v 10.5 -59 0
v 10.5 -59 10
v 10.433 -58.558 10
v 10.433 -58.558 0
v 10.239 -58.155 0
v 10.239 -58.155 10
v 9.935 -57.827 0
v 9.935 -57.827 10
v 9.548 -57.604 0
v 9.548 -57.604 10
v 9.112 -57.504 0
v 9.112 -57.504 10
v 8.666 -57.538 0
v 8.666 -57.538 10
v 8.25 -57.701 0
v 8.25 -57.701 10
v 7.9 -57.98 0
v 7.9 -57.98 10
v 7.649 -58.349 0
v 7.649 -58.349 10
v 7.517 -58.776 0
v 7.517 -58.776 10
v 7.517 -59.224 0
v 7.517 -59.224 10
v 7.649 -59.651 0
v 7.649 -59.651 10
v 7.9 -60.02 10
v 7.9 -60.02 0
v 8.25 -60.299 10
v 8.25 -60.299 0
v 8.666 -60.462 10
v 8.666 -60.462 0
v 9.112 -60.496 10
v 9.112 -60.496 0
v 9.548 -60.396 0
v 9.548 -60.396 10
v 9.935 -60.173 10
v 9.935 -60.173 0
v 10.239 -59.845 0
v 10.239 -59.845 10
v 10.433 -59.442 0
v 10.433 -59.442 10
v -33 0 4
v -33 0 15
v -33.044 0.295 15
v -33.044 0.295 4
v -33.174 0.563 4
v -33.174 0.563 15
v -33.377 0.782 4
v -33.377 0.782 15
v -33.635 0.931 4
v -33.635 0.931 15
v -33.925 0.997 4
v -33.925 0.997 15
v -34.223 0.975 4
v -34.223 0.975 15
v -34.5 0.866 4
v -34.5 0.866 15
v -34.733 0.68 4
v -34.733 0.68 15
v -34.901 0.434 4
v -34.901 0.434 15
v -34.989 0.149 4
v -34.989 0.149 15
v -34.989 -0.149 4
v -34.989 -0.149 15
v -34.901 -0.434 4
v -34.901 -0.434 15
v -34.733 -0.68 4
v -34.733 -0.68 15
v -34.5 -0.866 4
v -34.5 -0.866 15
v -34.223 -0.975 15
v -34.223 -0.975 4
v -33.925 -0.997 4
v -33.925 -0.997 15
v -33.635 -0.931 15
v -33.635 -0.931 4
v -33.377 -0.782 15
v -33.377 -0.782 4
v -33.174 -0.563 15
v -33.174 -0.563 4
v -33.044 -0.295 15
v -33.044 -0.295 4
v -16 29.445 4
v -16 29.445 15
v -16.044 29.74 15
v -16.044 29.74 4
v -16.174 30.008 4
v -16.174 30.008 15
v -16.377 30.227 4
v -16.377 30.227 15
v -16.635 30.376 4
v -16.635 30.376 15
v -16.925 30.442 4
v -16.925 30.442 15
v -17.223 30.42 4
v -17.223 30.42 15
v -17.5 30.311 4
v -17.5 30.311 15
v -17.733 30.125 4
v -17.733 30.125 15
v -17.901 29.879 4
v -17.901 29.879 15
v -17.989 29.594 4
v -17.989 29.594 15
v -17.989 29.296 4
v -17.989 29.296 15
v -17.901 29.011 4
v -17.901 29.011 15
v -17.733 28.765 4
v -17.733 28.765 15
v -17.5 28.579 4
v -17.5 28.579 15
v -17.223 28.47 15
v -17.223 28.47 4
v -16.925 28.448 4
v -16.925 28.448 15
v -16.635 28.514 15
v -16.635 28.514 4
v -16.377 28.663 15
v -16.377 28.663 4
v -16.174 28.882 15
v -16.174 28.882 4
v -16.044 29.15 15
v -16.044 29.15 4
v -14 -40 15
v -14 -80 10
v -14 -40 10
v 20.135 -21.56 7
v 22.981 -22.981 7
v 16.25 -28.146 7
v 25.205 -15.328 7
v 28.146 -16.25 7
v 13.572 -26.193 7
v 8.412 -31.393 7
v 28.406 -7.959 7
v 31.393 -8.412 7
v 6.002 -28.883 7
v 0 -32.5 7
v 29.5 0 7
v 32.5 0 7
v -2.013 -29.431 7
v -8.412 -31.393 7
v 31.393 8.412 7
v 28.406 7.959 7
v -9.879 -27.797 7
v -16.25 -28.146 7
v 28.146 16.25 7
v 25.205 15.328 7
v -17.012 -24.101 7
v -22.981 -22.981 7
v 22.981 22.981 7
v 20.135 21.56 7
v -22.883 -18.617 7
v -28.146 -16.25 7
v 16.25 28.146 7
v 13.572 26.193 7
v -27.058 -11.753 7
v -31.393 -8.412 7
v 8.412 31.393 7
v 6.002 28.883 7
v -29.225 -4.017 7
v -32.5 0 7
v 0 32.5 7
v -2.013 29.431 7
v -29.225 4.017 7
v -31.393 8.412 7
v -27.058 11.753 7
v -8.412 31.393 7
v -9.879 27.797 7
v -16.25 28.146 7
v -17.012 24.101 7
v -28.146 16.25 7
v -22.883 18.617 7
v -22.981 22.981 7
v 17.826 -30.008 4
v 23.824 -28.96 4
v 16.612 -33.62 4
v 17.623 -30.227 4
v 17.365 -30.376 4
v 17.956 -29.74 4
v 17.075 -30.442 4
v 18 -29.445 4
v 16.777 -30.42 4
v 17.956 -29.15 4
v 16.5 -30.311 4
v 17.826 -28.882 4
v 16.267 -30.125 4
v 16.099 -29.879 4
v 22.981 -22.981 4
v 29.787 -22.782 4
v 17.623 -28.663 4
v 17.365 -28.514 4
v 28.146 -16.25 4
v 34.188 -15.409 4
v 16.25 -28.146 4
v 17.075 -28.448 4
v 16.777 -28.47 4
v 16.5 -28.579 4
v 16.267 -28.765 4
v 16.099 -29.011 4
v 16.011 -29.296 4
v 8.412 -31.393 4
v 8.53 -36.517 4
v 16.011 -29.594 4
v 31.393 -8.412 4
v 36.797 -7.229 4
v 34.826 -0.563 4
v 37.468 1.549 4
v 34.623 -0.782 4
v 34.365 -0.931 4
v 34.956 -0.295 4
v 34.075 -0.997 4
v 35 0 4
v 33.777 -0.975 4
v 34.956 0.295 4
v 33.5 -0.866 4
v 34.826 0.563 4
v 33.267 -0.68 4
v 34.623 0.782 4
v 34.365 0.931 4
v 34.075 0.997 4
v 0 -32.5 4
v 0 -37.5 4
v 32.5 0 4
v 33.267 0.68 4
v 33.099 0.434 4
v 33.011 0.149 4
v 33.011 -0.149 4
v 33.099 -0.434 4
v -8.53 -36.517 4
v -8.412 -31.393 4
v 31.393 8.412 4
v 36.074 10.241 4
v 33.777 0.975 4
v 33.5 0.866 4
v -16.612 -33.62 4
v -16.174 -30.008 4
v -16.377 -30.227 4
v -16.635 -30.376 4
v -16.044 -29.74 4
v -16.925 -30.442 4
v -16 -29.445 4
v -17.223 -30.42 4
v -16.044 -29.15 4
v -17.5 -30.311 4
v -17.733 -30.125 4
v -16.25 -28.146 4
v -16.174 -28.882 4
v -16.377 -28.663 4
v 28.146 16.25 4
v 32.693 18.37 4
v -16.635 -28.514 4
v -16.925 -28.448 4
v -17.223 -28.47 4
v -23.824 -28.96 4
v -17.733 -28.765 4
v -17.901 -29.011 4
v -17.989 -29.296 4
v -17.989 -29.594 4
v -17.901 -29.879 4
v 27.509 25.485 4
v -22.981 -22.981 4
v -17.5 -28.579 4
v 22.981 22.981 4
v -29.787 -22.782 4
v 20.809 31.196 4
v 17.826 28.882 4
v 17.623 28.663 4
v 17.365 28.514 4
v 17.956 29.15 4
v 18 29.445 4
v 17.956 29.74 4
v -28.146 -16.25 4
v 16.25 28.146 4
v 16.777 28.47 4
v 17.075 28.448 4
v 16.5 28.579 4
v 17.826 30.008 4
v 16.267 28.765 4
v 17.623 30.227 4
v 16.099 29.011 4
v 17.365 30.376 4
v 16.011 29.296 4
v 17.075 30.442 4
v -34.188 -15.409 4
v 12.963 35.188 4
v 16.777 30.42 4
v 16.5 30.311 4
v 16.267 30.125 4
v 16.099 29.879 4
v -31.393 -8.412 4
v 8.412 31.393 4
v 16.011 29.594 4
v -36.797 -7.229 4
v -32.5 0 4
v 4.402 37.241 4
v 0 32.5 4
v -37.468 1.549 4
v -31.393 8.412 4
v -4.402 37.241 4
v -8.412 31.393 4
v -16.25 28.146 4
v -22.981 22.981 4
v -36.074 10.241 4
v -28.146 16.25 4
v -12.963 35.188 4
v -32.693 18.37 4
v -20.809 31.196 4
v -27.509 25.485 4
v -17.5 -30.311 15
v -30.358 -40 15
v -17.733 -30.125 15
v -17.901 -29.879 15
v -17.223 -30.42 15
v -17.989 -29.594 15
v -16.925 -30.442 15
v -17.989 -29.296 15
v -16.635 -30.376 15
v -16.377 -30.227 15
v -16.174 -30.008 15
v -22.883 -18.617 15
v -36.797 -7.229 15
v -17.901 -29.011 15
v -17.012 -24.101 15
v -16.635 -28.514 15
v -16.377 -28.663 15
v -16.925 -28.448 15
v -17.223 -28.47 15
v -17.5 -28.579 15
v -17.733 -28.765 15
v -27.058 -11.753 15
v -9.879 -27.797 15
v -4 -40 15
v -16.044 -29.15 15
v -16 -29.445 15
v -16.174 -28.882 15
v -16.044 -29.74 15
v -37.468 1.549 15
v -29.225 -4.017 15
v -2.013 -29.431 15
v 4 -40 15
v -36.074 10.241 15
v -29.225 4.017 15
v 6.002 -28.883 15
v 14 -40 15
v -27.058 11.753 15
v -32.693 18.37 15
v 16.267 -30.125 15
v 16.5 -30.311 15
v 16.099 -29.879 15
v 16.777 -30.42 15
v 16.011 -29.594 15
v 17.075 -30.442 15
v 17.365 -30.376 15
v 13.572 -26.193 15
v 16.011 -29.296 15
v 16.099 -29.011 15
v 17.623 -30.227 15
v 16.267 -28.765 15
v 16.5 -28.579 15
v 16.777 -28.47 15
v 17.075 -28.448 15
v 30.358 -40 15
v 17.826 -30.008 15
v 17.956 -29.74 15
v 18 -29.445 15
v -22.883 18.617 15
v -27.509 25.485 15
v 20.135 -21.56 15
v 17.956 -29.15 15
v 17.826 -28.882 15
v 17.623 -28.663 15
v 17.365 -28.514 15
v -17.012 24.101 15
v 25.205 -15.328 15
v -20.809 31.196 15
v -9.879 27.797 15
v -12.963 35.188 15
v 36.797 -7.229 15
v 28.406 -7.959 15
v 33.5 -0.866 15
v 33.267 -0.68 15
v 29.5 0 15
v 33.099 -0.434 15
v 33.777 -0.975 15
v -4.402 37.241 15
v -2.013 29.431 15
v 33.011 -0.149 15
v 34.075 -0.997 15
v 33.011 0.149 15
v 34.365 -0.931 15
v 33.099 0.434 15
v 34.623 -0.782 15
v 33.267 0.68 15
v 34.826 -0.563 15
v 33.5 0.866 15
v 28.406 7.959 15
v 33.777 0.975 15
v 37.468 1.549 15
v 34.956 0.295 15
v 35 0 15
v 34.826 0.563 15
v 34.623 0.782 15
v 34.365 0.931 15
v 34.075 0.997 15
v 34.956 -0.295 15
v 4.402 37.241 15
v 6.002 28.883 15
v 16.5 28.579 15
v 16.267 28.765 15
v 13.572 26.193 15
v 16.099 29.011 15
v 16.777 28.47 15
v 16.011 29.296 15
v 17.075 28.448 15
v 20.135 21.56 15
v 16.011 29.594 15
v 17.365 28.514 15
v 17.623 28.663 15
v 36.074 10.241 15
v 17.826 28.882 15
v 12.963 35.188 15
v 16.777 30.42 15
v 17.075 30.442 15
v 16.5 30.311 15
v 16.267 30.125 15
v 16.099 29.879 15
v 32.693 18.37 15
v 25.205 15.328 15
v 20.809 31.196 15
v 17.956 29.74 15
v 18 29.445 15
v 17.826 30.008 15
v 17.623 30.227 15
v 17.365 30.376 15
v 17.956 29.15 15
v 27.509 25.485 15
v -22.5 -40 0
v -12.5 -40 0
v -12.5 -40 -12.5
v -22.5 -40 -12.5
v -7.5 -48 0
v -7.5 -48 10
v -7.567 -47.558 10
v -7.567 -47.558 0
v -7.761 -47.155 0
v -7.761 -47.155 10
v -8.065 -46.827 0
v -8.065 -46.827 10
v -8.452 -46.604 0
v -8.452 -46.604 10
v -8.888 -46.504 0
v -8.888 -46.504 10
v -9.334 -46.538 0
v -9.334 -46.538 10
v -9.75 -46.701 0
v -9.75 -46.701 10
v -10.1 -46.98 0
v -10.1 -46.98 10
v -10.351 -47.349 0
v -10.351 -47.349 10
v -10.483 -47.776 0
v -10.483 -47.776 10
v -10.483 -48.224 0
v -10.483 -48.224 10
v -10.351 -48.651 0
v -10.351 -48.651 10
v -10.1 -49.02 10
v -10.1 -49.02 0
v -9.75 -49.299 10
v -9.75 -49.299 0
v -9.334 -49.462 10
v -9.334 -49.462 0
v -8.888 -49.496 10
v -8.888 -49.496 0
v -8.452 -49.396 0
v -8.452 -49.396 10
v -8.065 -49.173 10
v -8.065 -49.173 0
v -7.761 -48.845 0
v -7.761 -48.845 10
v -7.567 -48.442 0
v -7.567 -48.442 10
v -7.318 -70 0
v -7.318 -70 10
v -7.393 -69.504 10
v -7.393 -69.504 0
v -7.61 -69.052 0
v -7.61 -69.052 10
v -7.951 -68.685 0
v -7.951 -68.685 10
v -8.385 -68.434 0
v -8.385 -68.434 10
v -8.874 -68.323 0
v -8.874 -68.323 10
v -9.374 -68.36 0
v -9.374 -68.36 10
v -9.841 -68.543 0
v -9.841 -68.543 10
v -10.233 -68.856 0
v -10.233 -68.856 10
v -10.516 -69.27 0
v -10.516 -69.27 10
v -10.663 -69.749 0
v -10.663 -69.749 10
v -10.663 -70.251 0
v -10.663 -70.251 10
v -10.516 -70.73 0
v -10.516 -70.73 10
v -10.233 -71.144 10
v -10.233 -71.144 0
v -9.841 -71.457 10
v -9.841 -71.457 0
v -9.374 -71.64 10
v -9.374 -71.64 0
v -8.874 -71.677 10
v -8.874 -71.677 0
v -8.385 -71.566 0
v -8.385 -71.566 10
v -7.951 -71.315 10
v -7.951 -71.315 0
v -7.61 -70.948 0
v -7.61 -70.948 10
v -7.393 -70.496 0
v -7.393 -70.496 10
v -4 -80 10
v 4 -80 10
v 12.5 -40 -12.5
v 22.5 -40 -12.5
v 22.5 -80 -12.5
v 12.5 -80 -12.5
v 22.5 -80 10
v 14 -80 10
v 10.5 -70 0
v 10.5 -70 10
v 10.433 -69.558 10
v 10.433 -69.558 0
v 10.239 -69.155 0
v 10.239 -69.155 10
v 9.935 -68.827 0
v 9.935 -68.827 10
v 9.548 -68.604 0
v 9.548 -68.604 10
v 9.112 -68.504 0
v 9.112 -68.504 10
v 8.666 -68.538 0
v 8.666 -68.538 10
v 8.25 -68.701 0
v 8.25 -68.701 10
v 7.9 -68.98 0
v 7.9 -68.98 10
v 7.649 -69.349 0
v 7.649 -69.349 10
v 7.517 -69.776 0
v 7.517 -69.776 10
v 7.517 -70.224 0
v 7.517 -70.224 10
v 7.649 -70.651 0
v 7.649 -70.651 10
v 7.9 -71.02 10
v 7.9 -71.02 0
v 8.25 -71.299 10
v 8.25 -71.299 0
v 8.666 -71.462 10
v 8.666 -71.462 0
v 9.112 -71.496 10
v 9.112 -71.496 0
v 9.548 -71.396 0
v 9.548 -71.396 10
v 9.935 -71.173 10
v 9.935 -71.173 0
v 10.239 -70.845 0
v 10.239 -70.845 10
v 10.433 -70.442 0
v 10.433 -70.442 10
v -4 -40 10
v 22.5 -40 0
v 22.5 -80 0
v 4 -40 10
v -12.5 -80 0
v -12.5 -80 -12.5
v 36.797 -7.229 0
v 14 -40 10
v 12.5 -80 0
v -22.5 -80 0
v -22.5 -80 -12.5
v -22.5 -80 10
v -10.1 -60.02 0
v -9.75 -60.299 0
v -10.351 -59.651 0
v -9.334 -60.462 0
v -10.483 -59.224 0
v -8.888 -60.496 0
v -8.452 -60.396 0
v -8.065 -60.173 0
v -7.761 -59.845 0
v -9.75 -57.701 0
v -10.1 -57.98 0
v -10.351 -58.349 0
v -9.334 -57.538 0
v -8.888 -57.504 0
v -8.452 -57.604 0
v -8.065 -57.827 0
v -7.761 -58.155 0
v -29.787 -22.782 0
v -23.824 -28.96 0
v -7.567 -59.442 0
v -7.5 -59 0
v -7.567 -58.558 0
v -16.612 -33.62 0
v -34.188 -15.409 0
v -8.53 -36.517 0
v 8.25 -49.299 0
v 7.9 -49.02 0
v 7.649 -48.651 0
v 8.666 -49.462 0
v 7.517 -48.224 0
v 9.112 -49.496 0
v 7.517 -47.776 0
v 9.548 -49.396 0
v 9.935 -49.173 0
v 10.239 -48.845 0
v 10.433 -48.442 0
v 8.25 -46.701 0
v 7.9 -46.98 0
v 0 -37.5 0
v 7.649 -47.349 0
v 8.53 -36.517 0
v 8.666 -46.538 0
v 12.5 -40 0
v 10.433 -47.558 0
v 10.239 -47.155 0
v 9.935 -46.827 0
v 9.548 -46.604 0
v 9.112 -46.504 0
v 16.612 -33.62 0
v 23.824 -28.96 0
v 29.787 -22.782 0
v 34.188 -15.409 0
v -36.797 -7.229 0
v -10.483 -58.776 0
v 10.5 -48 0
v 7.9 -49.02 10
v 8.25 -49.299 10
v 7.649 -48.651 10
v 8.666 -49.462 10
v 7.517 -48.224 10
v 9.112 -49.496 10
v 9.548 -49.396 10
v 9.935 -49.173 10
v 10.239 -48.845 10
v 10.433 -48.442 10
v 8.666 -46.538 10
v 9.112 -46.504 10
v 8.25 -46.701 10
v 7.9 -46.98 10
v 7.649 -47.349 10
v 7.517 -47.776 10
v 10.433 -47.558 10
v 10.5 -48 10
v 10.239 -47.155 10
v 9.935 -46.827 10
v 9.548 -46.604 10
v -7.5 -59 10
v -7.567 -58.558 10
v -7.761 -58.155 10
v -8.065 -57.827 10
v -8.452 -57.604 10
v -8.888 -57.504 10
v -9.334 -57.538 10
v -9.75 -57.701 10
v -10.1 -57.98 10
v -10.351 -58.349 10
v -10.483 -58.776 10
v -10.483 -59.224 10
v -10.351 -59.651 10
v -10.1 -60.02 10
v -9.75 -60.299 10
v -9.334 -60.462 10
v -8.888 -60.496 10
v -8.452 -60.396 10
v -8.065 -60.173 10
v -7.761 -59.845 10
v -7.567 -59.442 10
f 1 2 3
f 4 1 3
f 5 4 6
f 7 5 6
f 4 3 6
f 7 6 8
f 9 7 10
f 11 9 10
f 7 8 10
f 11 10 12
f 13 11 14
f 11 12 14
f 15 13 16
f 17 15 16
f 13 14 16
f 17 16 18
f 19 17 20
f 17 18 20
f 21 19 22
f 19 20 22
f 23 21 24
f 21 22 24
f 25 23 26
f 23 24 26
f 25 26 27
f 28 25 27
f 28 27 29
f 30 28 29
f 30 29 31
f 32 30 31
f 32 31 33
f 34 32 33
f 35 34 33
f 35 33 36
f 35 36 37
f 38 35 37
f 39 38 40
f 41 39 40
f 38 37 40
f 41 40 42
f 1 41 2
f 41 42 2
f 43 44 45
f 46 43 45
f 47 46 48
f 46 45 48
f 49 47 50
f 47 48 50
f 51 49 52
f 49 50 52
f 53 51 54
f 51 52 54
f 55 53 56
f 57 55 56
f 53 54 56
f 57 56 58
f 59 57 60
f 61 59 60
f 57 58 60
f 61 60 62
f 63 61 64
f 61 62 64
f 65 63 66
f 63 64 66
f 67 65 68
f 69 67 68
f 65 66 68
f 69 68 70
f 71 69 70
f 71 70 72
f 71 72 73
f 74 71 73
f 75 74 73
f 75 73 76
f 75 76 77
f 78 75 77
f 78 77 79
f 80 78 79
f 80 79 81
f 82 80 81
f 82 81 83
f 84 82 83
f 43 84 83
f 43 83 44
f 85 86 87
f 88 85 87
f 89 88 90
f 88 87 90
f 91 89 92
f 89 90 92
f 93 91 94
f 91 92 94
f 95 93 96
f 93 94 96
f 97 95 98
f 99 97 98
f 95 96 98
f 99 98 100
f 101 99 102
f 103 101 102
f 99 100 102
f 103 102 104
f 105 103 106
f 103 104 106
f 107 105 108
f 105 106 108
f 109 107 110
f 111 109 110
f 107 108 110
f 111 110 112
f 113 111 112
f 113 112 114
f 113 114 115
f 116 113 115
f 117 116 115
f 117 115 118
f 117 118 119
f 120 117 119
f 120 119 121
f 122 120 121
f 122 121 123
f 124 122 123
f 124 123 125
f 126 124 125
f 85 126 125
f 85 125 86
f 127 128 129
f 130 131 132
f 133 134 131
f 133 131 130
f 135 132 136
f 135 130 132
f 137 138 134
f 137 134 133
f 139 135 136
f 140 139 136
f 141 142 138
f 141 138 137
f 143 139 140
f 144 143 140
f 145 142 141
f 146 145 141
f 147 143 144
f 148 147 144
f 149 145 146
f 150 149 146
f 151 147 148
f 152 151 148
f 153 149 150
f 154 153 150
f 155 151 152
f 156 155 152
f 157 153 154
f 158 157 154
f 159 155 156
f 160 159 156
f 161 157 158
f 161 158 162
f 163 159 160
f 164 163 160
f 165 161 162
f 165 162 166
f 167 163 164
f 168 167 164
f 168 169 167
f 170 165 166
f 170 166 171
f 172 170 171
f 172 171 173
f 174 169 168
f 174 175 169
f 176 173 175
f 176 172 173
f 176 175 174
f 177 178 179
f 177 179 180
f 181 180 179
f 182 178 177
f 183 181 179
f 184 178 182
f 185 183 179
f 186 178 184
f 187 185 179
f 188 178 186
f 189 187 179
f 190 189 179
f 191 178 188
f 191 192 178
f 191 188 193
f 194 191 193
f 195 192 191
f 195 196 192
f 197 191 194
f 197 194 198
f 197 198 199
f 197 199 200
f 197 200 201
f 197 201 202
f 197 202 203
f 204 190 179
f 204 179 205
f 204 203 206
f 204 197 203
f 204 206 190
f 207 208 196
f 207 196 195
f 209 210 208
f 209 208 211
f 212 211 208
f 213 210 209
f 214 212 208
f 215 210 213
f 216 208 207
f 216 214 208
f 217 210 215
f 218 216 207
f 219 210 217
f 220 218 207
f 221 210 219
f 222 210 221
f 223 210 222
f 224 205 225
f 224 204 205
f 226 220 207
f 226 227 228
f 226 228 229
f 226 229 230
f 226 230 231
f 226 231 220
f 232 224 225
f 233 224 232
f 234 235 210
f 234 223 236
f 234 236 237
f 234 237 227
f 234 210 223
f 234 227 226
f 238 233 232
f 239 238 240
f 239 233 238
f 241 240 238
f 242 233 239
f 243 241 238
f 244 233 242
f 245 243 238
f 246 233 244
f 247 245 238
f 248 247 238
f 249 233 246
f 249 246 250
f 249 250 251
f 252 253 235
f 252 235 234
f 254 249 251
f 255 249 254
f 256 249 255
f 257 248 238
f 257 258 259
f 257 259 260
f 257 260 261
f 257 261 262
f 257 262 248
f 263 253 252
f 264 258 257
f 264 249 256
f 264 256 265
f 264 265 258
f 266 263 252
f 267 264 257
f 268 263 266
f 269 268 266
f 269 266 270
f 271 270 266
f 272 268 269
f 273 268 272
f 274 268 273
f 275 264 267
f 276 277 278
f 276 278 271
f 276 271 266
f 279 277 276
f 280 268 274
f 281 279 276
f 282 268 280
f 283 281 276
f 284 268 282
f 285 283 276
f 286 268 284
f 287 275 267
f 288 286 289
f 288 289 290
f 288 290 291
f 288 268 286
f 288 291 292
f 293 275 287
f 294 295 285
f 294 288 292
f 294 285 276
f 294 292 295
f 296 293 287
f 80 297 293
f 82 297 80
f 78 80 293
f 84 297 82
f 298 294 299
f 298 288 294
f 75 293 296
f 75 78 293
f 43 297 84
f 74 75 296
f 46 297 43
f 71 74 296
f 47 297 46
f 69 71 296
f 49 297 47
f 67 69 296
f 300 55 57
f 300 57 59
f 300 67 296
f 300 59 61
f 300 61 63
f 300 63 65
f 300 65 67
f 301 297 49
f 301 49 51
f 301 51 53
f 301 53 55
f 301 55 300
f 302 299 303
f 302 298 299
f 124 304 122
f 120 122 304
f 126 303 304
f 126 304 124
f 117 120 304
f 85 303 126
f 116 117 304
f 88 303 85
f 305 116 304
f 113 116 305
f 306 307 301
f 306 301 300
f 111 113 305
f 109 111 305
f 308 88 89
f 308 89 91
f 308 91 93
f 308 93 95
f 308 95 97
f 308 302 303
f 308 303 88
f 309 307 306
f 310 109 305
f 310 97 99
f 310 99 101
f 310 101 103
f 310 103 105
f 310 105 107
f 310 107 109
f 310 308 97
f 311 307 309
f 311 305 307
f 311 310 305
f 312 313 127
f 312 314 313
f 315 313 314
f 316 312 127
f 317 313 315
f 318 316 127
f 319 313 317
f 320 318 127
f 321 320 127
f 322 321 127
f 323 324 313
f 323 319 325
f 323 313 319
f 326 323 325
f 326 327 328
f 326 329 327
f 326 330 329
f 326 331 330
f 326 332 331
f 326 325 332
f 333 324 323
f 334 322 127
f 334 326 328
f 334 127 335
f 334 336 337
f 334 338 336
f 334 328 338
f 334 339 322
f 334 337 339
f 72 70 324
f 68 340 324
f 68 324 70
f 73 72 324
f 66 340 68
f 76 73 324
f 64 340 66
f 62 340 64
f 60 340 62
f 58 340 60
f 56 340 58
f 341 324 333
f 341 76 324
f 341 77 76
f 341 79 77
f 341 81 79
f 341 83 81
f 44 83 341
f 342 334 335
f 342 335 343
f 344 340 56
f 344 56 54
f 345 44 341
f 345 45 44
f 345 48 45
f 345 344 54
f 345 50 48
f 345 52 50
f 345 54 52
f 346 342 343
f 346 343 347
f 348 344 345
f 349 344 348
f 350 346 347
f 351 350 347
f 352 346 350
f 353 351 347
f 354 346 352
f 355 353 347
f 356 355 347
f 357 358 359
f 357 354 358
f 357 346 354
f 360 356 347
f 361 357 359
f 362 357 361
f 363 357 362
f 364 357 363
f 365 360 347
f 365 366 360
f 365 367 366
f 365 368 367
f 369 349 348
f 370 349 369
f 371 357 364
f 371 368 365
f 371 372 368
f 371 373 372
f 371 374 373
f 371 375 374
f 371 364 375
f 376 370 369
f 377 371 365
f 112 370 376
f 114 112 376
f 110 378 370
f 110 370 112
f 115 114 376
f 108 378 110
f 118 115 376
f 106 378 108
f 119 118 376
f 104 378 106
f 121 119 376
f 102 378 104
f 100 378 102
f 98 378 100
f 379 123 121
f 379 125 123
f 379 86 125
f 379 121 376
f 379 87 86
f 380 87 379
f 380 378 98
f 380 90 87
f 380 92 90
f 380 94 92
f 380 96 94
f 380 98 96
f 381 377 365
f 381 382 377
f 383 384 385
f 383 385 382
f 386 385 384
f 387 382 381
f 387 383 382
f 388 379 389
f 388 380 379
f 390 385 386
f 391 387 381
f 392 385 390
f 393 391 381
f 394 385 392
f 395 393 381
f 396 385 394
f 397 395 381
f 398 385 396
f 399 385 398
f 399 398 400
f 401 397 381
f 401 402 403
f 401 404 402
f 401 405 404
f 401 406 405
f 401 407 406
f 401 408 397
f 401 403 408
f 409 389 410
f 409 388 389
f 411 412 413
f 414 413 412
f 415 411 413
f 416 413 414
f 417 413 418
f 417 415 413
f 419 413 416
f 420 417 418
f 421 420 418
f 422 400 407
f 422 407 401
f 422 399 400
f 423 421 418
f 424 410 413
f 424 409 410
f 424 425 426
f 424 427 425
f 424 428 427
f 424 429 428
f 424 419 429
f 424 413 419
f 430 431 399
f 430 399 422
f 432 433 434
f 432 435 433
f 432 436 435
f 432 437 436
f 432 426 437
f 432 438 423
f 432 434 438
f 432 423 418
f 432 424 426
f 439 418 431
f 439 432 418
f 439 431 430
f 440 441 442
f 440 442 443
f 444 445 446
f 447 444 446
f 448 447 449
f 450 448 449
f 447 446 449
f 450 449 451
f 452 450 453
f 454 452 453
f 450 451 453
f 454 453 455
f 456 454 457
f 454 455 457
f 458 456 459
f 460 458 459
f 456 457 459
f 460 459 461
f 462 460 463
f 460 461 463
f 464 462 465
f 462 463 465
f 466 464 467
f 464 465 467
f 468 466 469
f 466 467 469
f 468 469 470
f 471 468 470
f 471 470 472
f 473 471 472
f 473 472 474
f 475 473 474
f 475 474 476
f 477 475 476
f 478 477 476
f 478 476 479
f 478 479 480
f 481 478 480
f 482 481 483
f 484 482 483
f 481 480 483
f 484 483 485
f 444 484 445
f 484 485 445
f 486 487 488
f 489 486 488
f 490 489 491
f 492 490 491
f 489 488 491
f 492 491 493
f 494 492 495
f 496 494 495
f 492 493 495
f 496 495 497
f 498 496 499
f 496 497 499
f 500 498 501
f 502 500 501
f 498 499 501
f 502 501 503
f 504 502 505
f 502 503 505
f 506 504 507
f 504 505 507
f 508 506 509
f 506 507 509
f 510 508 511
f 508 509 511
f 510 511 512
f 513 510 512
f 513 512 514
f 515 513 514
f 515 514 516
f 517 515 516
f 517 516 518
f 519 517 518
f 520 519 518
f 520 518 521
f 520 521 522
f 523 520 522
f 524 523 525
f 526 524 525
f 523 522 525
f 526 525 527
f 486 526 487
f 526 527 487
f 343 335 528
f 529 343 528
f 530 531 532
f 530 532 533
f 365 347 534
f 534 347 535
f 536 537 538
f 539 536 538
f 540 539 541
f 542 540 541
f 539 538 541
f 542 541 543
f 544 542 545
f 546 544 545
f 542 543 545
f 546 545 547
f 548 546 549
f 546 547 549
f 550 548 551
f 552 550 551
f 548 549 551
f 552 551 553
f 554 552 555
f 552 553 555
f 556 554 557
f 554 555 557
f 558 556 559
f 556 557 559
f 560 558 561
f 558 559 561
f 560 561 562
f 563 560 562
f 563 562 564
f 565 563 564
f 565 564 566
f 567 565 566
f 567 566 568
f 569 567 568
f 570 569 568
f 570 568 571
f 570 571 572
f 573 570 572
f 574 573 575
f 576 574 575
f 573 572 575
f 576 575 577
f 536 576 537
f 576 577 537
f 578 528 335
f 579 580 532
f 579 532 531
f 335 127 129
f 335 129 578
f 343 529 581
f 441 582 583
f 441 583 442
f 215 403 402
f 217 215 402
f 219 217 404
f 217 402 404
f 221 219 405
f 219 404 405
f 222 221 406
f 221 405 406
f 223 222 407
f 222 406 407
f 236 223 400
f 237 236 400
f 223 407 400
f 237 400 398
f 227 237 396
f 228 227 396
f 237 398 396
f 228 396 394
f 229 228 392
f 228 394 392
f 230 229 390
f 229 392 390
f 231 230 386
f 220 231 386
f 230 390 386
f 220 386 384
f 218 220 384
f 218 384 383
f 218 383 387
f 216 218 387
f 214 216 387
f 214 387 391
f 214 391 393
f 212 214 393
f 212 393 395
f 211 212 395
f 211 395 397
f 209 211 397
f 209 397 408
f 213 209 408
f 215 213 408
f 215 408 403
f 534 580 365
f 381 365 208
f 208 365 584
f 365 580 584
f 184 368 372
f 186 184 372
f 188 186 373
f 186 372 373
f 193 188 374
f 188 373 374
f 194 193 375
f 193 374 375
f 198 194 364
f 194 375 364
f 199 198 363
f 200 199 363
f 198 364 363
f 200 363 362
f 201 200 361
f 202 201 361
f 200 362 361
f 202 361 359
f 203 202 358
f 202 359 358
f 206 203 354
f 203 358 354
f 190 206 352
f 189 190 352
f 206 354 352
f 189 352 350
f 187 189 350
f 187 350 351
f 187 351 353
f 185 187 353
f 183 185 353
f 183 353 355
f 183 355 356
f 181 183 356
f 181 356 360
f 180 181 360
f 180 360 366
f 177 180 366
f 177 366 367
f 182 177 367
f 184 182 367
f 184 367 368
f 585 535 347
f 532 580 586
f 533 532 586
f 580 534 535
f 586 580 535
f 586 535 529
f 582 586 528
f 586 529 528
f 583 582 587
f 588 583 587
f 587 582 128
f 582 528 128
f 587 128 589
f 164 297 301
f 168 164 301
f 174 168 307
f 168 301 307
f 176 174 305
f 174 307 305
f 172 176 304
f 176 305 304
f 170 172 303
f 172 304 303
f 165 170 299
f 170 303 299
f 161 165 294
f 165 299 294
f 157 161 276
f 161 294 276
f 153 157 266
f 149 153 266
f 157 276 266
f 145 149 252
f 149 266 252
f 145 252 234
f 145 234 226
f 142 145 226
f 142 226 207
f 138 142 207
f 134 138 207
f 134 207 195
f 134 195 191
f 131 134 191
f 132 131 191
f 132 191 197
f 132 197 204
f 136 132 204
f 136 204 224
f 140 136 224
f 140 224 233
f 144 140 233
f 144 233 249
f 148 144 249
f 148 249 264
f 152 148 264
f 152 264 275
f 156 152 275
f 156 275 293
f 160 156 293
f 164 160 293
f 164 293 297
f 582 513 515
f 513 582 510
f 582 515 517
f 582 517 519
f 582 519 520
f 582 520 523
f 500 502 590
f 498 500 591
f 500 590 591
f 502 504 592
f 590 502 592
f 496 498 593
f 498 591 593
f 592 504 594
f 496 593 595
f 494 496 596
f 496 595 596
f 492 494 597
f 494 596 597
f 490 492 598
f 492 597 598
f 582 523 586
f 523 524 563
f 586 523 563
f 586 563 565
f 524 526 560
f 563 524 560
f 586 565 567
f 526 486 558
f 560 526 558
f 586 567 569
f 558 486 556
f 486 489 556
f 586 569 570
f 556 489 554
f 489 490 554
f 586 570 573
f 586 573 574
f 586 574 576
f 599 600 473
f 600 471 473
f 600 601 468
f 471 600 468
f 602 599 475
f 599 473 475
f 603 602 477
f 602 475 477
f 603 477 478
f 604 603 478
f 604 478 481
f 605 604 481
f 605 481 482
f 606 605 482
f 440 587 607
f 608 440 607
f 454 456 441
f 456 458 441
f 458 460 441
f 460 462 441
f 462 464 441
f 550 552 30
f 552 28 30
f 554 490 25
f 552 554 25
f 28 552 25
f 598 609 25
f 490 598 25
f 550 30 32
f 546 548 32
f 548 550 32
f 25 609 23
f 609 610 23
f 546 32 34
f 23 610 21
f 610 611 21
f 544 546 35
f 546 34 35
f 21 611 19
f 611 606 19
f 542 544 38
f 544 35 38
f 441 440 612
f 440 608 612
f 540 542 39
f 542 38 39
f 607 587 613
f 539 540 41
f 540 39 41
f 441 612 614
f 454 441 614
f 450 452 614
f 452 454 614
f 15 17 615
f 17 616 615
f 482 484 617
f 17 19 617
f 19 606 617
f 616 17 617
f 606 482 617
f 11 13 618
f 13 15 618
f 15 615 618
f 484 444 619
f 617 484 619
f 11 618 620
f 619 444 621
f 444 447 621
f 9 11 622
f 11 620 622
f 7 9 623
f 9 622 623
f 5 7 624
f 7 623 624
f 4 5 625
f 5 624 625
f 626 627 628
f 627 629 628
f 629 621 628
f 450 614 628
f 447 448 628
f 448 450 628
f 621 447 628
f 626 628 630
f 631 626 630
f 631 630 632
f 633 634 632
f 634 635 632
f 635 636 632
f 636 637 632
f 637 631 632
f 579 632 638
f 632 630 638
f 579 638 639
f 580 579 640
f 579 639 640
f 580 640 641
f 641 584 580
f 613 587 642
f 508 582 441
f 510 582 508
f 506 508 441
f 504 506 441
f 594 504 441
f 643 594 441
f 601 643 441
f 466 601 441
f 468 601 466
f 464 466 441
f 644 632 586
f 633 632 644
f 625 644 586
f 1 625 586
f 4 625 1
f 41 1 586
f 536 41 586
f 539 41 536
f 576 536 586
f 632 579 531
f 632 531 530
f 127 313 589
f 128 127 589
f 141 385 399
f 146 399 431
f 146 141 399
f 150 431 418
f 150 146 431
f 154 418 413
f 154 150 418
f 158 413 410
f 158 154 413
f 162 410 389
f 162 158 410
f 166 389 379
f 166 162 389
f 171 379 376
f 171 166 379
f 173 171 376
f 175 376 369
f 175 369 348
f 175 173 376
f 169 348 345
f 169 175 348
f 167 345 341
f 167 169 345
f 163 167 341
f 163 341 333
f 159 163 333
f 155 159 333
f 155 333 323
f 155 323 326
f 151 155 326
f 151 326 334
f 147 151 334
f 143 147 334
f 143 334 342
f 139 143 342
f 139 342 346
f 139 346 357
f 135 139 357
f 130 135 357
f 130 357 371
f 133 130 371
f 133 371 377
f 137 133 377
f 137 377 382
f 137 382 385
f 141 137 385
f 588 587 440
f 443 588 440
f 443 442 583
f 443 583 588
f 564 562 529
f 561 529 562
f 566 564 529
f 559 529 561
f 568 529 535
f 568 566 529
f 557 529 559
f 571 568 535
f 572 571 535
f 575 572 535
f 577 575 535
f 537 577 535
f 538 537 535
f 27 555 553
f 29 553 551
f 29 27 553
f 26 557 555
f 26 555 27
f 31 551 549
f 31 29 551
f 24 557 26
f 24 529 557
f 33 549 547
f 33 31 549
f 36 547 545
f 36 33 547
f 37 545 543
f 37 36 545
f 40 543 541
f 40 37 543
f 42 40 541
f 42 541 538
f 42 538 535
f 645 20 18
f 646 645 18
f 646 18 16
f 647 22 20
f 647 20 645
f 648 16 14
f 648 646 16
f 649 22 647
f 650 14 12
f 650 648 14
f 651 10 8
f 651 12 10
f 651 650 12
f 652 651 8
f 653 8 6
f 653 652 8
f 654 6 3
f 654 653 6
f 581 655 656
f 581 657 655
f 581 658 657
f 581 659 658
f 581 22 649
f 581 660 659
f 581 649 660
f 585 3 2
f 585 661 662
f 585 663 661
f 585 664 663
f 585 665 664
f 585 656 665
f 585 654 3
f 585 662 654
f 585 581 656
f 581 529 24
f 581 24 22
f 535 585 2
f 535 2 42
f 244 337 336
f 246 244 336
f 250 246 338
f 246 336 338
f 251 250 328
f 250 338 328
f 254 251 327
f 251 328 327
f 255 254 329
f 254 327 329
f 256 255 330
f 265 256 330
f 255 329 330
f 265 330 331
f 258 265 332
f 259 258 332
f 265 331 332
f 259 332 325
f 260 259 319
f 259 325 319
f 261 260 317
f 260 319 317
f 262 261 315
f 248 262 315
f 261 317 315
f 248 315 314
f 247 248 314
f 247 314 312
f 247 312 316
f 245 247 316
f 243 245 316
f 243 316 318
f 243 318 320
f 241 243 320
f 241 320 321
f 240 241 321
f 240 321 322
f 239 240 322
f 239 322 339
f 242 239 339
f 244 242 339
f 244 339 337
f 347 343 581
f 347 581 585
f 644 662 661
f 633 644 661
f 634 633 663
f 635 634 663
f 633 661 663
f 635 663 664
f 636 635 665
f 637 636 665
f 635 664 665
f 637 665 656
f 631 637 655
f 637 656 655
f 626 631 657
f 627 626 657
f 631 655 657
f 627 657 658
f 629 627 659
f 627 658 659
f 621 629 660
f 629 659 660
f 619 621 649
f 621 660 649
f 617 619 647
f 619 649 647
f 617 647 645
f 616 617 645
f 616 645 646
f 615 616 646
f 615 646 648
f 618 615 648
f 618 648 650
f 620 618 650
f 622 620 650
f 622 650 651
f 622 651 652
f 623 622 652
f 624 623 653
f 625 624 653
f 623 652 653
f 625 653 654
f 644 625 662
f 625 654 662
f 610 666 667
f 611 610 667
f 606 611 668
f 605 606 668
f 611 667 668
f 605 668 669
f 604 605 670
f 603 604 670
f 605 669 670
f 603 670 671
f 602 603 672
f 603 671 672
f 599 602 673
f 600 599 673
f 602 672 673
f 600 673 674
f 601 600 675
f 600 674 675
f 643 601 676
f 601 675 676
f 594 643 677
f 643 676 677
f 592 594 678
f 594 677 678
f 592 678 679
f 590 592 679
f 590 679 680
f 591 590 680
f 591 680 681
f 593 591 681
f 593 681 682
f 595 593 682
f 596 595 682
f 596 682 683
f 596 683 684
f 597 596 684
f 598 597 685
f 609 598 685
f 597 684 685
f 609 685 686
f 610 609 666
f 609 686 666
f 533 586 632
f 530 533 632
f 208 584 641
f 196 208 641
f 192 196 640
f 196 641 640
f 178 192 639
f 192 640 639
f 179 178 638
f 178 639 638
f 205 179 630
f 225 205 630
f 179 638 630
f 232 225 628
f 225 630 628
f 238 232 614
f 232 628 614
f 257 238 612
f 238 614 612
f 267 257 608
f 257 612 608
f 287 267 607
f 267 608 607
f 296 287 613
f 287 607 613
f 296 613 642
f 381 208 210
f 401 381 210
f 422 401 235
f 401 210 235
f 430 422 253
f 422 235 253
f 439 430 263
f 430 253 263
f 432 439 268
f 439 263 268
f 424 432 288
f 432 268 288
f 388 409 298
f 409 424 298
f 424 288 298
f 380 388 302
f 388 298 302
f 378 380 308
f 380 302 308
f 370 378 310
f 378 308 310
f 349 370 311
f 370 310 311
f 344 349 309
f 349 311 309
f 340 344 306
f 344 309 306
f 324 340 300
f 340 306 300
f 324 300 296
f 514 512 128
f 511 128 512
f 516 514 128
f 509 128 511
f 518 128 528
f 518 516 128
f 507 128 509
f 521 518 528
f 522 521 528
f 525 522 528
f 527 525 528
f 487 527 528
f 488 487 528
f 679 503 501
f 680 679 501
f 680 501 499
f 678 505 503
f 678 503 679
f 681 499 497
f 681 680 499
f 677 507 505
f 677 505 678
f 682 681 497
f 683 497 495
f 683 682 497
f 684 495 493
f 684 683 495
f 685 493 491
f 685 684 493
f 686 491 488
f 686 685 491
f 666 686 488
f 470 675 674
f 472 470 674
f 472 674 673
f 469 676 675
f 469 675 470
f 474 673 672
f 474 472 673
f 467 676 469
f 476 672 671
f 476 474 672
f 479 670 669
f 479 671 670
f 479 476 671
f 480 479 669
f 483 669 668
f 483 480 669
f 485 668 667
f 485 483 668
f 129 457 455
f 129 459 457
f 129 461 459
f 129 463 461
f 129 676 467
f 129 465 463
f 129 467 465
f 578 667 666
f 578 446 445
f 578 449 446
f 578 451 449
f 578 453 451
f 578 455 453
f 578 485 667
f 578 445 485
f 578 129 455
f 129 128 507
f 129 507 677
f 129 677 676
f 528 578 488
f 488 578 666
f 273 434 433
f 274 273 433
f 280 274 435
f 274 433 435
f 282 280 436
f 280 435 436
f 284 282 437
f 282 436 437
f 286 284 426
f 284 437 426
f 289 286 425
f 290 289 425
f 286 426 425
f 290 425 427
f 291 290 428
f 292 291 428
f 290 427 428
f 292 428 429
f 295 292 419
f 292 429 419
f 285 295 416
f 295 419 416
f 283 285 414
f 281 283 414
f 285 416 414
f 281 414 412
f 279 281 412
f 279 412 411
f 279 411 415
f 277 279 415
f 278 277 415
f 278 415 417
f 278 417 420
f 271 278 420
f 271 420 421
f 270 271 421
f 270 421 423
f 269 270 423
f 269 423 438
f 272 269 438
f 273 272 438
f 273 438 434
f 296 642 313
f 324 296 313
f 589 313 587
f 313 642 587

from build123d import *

# Parameters (mm, degrees)
SKETCH1_R               = 29.5
BOSS_EXTRUDE1_DEPTH     = 15
SKETCH2_R               = 32.5
SKETCH2_R_2             = 27.5
CUT_EXTRUDE1_DEPTH      = 7
SKETCH9_R               = 1
CUT_EXTRUDE5_DEPTH      = 15
SKETCH10_R              = 37.5
CUT_EXTRUDE6_DEPTH      = 4
CUT_EXTRUDE7_DEPTH      = 35
CUT_EXTRUDE7_DEPTH_BACK = 35
SKETCH12_W              = 10
SKETCH12_H              = 40
CUT_EXTRUDE8_DEPTH      = 5
SKETCH13_R              = 1.5
SKETCH13_R_2            = 1.68215716
CUT_EXTRUDE9_DEPTH      = 10
SKETCH14_W              = 10
SKETCH14_H              = 40
BOSS_EXTRUDE2_DEPTH     = 12.5


with BuildPart() as part:
    # Sketch1 → Boss-Extrude1 (new body)
    with BuildSketch(Plane.XY):
        with BuildLine():
            Line((-36.796608813, -7.229078771), (-22.5, -80))
            Line((-22.5, -80), (22.5, -80))
            Line((22.5, -80), (36.796608813, -7.229078771))
            ThreePointArc((36.796608813, -7.229078771), (0, 37.5), (-36.796608813, -7.229078771))
        make_face()
        Circle(SKETCH1_R, mode=Mode.SUBTRACT)
    extrude(amount=BOSS_EXTRUDE1_DEPTH)

    # Sketch2 → Cut-Extrude1 (cut)
    with BuildSketch(Plane(origin=(0, 0, 0), x_dir=(-1, 0, 0), z_dir=(0, 0, -1))):
        Circle(SKETCH2_R)
        Circle(SKETCH2_R_2, mode=Mode.SUBTRACT)
    extrude(amount=-CUT_EXTRUDE1_DEPTH, mode=Mode.SUBTRACT)

    # Sketch9 → Cut-Extrude5 (cut)
    with BuildSketch(Plane.XY.offset(15)):
        with Locations((17, 29.444863729)):
            Circle(SKETCH9_R)
        with Locations((34, 0)):
            Circle(SKETCH9_R)
        with Locations((17, -29.444863729)):
            Circle(SKETCH9_R)
        with Locations((-17, -29.444863729)):
            Circle(SKETCH9_R)
        with Locations((-34, 0)):
            Circle(SKETCH9_R)
        with Locations((-17, 29.444863729)):
            Circle(SKETCH9_R)
    extrude(amount=-CUT_EXTRUDE5_DEPTH, mode=Mode.SUBTRACT)

    # Sketch10 → Cut-Extrude6 (cut)
    with BuildSketch(Plane(origin=(0, 0, 0), x_dir=(-1, 0, 0), z_dir=(0, 0, -1))):
        Circle(SKETCH10_R)
    extrude(amount=-CUT_EXTRUDE6_DEPTH, mode=Mode.SUBTRACT)

    # Sketch11 → Cut-Extrude7 (cut, two sides: drawn at the far end of the back side and taken through both)
    with BuildSketch(Plane(origin=(0, 0, 0), x_dir=(0, 0, -1), z_dir=(1, 0, 0)).offset(-CUT_EXTRUDE7_DEPTH_BACK)):
        Polygon((-15, -80), (-15, -40), (-10, -80), align=None)
    extrude(amount=CUT_EXTRUDE7_DEPTH + CUT_EXTRUDE7_DEPTH_BACK, mode=Mode.SUBTRACT)

    # Sketch12 → Cut-Extrude8 (cut)
    with BuildSketch(Plane.XY.offset(15)):
        with Locations((-9, -60)):
            Rectangle(SKETCH12_W, SKETCH12_H)
        with Locations((9, -60)):
            Rectangle(SKETCH12_W, SKETCH12_H)
    extrude(amount=-CUT_EXTRUDE8_DEPTH, mode=Mode.SUBTRACT)

    # Sketch13 → Cut-Extrude9 (cut)
    with BuildSketch(Plane.XY.offset(10)):
        with Locations((-9, -48)):
            Circle(SKETCH13_R)
        with Locations((-9, -59)):
            Circle(SKETCH13_R)
        with Locations((-9, -70)):
            Circle(SKETCH13_R_2)
        with Locations((9, -70)):
            Circle(SKETCH13_R)
        with Locations((9, -59)):
            Circle(SKETCH13_R)
        with Locations((9, -48)):
            Circle(SKETCH13_R)
    extrude(amount=-CUT_EXTRUDE9_DEPTH, mode=Mode.SUBTRACT)

    # Sketch14 → Boss-Extrude2 (add)
    with BuildSketch(Plane(origin=(0, 0, 0), x_dir=(-1, 0, 0), z_dir=(0, 0, -1))):
        with Locations((-17.5, -60)):
            Rectangle(SKETCH14_W, SKETCH14_H)
        with Locations((17.5, -60)):
            Rectangle(SKETCH14_W, SKETCH14_H)
    extrude(amount=BOSS_EXTRUDE2_DEPTH)


solid = part.part
